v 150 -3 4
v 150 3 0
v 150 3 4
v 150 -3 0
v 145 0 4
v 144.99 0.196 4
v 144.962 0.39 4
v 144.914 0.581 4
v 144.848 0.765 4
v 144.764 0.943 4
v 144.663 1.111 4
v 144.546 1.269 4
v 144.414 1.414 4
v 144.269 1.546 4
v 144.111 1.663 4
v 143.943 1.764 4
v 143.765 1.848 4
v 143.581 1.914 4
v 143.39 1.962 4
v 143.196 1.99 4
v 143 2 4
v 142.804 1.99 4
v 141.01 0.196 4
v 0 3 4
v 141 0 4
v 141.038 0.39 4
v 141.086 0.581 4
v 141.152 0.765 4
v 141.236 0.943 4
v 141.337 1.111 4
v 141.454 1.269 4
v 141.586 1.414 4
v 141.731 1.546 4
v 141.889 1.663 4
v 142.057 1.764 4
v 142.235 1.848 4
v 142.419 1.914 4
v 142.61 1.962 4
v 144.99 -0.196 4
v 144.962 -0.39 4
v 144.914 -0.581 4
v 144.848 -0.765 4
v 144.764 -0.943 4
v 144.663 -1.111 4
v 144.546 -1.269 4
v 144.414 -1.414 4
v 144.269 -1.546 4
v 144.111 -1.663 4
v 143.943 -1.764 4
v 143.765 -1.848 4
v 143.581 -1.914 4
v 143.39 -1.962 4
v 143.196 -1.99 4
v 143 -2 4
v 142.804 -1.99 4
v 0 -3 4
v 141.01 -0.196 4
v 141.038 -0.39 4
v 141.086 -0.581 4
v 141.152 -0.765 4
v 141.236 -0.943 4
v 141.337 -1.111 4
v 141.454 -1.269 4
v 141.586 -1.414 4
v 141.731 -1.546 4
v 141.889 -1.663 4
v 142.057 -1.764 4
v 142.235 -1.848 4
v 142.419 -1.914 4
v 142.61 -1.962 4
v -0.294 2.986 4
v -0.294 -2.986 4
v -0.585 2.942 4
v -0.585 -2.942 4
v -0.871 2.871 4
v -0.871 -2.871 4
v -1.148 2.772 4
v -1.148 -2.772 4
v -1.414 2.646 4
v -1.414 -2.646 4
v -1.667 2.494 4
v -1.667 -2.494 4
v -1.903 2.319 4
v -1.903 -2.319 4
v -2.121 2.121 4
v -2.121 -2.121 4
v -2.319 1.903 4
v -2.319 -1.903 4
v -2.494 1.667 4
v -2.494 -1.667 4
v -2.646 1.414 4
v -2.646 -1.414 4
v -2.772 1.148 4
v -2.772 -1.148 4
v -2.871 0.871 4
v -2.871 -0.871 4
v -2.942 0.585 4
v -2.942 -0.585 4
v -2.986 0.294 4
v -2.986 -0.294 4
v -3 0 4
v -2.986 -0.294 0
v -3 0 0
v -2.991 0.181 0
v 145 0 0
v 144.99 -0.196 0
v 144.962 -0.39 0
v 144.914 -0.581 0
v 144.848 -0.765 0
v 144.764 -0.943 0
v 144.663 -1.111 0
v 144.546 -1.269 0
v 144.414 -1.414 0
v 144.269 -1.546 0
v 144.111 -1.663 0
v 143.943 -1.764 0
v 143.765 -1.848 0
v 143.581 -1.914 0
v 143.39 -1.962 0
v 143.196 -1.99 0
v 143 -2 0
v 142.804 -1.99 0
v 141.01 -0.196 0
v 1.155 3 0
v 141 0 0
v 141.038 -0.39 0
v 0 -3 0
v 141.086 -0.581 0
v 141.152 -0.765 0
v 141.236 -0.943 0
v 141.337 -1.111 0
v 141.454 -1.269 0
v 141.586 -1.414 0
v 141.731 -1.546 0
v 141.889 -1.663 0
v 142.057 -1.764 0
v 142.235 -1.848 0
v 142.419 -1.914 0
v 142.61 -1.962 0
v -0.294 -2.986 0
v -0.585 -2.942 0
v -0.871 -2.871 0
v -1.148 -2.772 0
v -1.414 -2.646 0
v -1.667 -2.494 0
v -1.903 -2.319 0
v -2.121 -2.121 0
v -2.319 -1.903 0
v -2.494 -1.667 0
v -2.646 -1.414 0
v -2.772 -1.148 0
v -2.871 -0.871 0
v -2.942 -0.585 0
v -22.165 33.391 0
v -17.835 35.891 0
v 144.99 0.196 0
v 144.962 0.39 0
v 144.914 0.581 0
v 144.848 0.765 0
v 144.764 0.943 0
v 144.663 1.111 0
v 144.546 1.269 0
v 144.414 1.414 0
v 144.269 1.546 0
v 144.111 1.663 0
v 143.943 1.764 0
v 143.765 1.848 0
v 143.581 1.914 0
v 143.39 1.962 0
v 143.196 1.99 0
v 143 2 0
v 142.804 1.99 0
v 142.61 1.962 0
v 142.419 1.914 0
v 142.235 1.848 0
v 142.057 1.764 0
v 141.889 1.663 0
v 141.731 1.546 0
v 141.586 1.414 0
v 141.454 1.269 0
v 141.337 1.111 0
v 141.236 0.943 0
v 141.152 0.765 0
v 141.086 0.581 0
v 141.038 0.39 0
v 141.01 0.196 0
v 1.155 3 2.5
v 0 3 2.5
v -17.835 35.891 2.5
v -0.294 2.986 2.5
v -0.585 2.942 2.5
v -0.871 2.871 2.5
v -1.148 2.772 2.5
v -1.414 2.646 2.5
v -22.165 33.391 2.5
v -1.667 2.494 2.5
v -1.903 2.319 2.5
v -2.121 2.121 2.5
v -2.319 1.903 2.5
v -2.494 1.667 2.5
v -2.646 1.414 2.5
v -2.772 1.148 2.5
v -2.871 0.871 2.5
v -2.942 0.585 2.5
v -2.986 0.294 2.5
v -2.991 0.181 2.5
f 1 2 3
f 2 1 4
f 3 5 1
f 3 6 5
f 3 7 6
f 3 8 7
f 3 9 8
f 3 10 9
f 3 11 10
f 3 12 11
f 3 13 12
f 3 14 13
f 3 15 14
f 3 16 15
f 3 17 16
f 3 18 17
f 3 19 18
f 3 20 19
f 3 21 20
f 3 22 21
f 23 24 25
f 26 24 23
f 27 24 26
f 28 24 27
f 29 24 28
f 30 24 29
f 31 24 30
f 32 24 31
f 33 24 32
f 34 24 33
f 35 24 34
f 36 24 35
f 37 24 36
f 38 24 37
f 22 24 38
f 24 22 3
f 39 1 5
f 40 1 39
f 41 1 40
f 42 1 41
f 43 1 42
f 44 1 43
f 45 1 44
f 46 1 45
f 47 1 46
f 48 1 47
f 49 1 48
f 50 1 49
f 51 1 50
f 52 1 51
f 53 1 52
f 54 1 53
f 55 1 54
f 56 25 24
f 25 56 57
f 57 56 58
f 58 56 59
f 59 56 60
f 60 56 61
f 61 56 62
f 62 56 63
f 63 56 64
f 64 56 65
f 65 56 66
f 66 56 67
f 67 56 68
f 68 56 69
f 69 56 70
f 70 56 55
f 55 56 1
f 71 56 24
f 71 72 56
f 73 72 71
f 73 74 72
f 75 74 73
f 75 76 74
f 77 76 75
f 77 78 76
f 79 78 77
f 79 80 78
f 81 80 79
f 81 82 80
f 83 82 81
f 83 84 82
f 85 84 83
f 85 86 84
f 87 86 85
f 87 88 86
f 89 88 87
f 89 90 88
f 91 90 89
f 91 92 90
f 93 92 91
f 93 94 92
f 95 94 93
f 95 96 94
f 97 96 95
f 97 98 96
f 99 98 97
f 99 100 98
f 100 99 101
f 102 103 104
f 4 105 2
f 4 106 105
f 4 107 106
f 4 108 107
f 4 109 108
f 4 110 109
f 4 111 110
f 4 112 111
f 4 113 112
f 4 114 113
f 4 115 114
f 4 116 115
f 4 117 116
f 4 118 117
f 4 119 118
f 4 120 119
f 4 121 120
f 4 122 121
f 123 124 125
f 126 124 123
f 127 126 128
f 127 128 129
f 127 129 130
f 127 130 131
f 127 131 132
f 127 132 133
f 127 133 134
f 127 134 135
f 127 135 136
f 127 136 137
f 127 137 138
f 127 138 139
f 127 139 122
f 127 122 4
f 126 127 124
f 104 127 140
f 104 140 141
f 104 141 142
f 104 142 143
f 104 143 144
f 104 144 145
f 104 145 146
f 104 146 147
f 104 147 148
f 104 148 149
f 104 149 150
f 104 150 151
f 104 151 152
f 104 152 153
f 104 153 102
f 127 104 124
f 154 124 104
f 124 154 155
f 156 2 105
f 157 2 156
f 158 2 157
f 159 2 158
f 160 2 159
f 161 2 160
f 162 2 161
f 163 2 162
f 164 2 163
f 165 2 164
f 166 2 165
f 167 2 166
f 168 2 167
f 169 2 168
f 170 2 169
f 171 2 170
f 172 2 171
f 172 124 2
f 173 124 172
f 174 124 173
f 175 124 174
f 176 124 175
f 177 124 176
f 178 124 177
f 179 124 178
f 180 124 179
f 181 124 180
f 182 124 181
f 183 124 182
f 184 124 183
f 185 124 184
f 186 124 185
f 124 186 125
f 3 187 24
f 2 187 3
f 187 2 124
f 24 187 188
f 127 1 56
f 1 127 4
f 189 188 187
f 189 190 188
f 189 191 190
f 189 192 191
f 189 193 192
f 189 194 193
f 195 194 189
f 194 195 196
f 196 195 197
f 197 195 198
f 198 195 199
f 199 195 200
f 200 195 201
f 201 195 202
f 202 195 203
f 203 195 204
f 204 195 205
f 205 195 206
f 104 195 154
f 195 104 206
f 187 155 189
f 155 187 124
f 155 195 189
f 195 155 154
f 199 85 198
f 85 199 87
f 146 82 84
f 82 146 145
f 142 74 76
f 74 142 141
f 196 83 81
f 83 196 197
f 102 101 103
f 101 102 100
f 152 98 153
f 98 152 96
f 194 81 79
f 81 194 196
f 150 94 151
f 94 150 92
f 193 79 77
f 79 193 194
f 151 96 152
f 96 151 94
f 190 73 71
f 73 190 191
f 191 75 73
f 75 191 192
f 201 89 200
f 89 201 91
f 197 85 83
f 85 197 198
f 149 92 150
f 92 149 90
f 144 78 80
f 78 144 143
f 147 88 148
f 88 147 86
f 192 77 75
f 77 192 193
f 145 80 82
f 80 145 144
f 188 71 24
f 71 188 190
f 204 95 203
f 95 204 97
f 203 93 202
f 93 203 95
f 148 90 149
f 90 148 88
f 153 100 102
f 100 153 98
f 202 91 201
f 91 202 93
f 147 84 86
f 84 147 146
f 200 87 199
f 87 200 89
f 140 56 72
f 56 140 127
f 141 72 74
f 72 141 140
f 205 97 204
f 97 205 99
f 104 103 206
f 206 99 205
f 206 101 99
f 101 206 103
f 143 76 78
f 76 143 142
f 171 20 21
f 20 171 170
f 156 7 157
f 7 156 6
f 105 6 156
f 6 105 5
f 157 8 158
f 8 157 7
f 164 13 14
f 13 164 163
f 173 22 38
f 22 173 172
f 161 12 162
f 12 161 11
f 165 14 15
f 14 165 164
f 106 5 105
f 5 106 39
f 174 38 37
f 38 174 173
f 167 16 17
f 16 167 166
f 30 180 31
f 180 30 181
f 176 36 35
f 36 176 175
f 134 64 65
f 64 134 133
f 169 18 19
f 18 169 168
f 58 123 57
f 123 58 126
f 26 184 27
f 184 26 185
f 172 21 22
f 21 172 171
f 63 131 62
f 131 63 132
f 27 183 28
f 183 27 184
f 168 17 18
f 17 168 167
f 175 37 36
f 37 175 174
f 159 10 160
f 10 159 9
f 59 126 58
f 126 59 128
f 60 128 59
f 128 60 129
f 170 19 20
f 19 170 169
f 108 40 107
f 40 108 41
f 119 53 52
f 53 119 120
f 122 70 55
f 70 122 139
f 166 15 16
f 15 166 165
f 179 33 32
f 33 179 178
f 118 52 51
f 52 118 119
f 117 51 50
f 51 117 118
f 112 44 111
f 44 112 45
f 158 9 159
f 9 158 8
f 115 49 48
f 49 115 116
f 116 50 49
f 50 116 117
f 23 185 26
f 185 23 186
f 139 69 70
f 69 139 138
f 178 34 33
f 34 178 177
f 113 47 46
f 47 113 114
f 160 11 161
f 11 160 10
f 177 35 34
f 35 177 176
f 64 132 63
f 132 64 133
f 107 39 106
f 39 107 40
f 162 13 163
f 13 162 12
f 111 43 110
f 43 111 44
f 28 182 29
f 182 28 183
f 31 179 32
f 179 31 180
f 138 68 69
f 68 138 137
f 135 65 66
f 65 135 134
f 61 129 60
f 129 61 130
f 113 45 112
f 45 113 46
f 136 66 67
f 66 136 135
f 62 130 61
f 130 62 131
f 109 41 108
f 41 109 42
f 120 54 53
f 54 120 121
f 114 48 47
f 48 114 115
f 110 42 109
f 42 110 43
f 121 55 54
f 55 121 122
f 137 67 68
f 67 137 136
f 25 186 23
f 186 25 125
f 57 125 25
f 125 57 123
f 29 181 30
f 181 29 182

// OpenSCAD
// Hockey-stick cell spreader, printed flat

$fn = 64;

// Handle
handle_len   = 150;   // handle length along +X
handle_w     = 6;     // handle width (Y)
handle_t     = 4;     // handle thickness (Z)

// Foot
foot_len     = 40;    // foot length
foot_w       = 5;     // foot width
foot_t       = 2.5;   // foot thickness (Z)
foot_angle   = 120;   // foot direction, CCW from +X

// Boss at origin
boss_d       = 6;     // boss diameter
boss_h       = 4;     // boss height

// Hanging hole
hole_d       = 4;     // hole diameter
hole_x       = 143;   // hole X position
hole_y       = 0;     // hole Y position

eps = 0.5;            // cutter overshoot

difference() {
    union() {
        // handle bar
        translate([0, -handle_w/2, 0])
            cube([handle_len, handle_w, handle_t]);

        // foot bar, centre line from origin at foot_angle
        rotate([0, 0, foot_angle])
            translate([0, -foot_w/2, 0])
                cube([foot_len, foot_w, foot_t]);

        // joining boss
        cylinder(d = boss_d, h = boss_h);
    }

    // hanging hole through the handle
    translate([hole_x, hole_y, -eps])
        cylinder(d = hole_d, h = handle_t + 2*eps);
}
